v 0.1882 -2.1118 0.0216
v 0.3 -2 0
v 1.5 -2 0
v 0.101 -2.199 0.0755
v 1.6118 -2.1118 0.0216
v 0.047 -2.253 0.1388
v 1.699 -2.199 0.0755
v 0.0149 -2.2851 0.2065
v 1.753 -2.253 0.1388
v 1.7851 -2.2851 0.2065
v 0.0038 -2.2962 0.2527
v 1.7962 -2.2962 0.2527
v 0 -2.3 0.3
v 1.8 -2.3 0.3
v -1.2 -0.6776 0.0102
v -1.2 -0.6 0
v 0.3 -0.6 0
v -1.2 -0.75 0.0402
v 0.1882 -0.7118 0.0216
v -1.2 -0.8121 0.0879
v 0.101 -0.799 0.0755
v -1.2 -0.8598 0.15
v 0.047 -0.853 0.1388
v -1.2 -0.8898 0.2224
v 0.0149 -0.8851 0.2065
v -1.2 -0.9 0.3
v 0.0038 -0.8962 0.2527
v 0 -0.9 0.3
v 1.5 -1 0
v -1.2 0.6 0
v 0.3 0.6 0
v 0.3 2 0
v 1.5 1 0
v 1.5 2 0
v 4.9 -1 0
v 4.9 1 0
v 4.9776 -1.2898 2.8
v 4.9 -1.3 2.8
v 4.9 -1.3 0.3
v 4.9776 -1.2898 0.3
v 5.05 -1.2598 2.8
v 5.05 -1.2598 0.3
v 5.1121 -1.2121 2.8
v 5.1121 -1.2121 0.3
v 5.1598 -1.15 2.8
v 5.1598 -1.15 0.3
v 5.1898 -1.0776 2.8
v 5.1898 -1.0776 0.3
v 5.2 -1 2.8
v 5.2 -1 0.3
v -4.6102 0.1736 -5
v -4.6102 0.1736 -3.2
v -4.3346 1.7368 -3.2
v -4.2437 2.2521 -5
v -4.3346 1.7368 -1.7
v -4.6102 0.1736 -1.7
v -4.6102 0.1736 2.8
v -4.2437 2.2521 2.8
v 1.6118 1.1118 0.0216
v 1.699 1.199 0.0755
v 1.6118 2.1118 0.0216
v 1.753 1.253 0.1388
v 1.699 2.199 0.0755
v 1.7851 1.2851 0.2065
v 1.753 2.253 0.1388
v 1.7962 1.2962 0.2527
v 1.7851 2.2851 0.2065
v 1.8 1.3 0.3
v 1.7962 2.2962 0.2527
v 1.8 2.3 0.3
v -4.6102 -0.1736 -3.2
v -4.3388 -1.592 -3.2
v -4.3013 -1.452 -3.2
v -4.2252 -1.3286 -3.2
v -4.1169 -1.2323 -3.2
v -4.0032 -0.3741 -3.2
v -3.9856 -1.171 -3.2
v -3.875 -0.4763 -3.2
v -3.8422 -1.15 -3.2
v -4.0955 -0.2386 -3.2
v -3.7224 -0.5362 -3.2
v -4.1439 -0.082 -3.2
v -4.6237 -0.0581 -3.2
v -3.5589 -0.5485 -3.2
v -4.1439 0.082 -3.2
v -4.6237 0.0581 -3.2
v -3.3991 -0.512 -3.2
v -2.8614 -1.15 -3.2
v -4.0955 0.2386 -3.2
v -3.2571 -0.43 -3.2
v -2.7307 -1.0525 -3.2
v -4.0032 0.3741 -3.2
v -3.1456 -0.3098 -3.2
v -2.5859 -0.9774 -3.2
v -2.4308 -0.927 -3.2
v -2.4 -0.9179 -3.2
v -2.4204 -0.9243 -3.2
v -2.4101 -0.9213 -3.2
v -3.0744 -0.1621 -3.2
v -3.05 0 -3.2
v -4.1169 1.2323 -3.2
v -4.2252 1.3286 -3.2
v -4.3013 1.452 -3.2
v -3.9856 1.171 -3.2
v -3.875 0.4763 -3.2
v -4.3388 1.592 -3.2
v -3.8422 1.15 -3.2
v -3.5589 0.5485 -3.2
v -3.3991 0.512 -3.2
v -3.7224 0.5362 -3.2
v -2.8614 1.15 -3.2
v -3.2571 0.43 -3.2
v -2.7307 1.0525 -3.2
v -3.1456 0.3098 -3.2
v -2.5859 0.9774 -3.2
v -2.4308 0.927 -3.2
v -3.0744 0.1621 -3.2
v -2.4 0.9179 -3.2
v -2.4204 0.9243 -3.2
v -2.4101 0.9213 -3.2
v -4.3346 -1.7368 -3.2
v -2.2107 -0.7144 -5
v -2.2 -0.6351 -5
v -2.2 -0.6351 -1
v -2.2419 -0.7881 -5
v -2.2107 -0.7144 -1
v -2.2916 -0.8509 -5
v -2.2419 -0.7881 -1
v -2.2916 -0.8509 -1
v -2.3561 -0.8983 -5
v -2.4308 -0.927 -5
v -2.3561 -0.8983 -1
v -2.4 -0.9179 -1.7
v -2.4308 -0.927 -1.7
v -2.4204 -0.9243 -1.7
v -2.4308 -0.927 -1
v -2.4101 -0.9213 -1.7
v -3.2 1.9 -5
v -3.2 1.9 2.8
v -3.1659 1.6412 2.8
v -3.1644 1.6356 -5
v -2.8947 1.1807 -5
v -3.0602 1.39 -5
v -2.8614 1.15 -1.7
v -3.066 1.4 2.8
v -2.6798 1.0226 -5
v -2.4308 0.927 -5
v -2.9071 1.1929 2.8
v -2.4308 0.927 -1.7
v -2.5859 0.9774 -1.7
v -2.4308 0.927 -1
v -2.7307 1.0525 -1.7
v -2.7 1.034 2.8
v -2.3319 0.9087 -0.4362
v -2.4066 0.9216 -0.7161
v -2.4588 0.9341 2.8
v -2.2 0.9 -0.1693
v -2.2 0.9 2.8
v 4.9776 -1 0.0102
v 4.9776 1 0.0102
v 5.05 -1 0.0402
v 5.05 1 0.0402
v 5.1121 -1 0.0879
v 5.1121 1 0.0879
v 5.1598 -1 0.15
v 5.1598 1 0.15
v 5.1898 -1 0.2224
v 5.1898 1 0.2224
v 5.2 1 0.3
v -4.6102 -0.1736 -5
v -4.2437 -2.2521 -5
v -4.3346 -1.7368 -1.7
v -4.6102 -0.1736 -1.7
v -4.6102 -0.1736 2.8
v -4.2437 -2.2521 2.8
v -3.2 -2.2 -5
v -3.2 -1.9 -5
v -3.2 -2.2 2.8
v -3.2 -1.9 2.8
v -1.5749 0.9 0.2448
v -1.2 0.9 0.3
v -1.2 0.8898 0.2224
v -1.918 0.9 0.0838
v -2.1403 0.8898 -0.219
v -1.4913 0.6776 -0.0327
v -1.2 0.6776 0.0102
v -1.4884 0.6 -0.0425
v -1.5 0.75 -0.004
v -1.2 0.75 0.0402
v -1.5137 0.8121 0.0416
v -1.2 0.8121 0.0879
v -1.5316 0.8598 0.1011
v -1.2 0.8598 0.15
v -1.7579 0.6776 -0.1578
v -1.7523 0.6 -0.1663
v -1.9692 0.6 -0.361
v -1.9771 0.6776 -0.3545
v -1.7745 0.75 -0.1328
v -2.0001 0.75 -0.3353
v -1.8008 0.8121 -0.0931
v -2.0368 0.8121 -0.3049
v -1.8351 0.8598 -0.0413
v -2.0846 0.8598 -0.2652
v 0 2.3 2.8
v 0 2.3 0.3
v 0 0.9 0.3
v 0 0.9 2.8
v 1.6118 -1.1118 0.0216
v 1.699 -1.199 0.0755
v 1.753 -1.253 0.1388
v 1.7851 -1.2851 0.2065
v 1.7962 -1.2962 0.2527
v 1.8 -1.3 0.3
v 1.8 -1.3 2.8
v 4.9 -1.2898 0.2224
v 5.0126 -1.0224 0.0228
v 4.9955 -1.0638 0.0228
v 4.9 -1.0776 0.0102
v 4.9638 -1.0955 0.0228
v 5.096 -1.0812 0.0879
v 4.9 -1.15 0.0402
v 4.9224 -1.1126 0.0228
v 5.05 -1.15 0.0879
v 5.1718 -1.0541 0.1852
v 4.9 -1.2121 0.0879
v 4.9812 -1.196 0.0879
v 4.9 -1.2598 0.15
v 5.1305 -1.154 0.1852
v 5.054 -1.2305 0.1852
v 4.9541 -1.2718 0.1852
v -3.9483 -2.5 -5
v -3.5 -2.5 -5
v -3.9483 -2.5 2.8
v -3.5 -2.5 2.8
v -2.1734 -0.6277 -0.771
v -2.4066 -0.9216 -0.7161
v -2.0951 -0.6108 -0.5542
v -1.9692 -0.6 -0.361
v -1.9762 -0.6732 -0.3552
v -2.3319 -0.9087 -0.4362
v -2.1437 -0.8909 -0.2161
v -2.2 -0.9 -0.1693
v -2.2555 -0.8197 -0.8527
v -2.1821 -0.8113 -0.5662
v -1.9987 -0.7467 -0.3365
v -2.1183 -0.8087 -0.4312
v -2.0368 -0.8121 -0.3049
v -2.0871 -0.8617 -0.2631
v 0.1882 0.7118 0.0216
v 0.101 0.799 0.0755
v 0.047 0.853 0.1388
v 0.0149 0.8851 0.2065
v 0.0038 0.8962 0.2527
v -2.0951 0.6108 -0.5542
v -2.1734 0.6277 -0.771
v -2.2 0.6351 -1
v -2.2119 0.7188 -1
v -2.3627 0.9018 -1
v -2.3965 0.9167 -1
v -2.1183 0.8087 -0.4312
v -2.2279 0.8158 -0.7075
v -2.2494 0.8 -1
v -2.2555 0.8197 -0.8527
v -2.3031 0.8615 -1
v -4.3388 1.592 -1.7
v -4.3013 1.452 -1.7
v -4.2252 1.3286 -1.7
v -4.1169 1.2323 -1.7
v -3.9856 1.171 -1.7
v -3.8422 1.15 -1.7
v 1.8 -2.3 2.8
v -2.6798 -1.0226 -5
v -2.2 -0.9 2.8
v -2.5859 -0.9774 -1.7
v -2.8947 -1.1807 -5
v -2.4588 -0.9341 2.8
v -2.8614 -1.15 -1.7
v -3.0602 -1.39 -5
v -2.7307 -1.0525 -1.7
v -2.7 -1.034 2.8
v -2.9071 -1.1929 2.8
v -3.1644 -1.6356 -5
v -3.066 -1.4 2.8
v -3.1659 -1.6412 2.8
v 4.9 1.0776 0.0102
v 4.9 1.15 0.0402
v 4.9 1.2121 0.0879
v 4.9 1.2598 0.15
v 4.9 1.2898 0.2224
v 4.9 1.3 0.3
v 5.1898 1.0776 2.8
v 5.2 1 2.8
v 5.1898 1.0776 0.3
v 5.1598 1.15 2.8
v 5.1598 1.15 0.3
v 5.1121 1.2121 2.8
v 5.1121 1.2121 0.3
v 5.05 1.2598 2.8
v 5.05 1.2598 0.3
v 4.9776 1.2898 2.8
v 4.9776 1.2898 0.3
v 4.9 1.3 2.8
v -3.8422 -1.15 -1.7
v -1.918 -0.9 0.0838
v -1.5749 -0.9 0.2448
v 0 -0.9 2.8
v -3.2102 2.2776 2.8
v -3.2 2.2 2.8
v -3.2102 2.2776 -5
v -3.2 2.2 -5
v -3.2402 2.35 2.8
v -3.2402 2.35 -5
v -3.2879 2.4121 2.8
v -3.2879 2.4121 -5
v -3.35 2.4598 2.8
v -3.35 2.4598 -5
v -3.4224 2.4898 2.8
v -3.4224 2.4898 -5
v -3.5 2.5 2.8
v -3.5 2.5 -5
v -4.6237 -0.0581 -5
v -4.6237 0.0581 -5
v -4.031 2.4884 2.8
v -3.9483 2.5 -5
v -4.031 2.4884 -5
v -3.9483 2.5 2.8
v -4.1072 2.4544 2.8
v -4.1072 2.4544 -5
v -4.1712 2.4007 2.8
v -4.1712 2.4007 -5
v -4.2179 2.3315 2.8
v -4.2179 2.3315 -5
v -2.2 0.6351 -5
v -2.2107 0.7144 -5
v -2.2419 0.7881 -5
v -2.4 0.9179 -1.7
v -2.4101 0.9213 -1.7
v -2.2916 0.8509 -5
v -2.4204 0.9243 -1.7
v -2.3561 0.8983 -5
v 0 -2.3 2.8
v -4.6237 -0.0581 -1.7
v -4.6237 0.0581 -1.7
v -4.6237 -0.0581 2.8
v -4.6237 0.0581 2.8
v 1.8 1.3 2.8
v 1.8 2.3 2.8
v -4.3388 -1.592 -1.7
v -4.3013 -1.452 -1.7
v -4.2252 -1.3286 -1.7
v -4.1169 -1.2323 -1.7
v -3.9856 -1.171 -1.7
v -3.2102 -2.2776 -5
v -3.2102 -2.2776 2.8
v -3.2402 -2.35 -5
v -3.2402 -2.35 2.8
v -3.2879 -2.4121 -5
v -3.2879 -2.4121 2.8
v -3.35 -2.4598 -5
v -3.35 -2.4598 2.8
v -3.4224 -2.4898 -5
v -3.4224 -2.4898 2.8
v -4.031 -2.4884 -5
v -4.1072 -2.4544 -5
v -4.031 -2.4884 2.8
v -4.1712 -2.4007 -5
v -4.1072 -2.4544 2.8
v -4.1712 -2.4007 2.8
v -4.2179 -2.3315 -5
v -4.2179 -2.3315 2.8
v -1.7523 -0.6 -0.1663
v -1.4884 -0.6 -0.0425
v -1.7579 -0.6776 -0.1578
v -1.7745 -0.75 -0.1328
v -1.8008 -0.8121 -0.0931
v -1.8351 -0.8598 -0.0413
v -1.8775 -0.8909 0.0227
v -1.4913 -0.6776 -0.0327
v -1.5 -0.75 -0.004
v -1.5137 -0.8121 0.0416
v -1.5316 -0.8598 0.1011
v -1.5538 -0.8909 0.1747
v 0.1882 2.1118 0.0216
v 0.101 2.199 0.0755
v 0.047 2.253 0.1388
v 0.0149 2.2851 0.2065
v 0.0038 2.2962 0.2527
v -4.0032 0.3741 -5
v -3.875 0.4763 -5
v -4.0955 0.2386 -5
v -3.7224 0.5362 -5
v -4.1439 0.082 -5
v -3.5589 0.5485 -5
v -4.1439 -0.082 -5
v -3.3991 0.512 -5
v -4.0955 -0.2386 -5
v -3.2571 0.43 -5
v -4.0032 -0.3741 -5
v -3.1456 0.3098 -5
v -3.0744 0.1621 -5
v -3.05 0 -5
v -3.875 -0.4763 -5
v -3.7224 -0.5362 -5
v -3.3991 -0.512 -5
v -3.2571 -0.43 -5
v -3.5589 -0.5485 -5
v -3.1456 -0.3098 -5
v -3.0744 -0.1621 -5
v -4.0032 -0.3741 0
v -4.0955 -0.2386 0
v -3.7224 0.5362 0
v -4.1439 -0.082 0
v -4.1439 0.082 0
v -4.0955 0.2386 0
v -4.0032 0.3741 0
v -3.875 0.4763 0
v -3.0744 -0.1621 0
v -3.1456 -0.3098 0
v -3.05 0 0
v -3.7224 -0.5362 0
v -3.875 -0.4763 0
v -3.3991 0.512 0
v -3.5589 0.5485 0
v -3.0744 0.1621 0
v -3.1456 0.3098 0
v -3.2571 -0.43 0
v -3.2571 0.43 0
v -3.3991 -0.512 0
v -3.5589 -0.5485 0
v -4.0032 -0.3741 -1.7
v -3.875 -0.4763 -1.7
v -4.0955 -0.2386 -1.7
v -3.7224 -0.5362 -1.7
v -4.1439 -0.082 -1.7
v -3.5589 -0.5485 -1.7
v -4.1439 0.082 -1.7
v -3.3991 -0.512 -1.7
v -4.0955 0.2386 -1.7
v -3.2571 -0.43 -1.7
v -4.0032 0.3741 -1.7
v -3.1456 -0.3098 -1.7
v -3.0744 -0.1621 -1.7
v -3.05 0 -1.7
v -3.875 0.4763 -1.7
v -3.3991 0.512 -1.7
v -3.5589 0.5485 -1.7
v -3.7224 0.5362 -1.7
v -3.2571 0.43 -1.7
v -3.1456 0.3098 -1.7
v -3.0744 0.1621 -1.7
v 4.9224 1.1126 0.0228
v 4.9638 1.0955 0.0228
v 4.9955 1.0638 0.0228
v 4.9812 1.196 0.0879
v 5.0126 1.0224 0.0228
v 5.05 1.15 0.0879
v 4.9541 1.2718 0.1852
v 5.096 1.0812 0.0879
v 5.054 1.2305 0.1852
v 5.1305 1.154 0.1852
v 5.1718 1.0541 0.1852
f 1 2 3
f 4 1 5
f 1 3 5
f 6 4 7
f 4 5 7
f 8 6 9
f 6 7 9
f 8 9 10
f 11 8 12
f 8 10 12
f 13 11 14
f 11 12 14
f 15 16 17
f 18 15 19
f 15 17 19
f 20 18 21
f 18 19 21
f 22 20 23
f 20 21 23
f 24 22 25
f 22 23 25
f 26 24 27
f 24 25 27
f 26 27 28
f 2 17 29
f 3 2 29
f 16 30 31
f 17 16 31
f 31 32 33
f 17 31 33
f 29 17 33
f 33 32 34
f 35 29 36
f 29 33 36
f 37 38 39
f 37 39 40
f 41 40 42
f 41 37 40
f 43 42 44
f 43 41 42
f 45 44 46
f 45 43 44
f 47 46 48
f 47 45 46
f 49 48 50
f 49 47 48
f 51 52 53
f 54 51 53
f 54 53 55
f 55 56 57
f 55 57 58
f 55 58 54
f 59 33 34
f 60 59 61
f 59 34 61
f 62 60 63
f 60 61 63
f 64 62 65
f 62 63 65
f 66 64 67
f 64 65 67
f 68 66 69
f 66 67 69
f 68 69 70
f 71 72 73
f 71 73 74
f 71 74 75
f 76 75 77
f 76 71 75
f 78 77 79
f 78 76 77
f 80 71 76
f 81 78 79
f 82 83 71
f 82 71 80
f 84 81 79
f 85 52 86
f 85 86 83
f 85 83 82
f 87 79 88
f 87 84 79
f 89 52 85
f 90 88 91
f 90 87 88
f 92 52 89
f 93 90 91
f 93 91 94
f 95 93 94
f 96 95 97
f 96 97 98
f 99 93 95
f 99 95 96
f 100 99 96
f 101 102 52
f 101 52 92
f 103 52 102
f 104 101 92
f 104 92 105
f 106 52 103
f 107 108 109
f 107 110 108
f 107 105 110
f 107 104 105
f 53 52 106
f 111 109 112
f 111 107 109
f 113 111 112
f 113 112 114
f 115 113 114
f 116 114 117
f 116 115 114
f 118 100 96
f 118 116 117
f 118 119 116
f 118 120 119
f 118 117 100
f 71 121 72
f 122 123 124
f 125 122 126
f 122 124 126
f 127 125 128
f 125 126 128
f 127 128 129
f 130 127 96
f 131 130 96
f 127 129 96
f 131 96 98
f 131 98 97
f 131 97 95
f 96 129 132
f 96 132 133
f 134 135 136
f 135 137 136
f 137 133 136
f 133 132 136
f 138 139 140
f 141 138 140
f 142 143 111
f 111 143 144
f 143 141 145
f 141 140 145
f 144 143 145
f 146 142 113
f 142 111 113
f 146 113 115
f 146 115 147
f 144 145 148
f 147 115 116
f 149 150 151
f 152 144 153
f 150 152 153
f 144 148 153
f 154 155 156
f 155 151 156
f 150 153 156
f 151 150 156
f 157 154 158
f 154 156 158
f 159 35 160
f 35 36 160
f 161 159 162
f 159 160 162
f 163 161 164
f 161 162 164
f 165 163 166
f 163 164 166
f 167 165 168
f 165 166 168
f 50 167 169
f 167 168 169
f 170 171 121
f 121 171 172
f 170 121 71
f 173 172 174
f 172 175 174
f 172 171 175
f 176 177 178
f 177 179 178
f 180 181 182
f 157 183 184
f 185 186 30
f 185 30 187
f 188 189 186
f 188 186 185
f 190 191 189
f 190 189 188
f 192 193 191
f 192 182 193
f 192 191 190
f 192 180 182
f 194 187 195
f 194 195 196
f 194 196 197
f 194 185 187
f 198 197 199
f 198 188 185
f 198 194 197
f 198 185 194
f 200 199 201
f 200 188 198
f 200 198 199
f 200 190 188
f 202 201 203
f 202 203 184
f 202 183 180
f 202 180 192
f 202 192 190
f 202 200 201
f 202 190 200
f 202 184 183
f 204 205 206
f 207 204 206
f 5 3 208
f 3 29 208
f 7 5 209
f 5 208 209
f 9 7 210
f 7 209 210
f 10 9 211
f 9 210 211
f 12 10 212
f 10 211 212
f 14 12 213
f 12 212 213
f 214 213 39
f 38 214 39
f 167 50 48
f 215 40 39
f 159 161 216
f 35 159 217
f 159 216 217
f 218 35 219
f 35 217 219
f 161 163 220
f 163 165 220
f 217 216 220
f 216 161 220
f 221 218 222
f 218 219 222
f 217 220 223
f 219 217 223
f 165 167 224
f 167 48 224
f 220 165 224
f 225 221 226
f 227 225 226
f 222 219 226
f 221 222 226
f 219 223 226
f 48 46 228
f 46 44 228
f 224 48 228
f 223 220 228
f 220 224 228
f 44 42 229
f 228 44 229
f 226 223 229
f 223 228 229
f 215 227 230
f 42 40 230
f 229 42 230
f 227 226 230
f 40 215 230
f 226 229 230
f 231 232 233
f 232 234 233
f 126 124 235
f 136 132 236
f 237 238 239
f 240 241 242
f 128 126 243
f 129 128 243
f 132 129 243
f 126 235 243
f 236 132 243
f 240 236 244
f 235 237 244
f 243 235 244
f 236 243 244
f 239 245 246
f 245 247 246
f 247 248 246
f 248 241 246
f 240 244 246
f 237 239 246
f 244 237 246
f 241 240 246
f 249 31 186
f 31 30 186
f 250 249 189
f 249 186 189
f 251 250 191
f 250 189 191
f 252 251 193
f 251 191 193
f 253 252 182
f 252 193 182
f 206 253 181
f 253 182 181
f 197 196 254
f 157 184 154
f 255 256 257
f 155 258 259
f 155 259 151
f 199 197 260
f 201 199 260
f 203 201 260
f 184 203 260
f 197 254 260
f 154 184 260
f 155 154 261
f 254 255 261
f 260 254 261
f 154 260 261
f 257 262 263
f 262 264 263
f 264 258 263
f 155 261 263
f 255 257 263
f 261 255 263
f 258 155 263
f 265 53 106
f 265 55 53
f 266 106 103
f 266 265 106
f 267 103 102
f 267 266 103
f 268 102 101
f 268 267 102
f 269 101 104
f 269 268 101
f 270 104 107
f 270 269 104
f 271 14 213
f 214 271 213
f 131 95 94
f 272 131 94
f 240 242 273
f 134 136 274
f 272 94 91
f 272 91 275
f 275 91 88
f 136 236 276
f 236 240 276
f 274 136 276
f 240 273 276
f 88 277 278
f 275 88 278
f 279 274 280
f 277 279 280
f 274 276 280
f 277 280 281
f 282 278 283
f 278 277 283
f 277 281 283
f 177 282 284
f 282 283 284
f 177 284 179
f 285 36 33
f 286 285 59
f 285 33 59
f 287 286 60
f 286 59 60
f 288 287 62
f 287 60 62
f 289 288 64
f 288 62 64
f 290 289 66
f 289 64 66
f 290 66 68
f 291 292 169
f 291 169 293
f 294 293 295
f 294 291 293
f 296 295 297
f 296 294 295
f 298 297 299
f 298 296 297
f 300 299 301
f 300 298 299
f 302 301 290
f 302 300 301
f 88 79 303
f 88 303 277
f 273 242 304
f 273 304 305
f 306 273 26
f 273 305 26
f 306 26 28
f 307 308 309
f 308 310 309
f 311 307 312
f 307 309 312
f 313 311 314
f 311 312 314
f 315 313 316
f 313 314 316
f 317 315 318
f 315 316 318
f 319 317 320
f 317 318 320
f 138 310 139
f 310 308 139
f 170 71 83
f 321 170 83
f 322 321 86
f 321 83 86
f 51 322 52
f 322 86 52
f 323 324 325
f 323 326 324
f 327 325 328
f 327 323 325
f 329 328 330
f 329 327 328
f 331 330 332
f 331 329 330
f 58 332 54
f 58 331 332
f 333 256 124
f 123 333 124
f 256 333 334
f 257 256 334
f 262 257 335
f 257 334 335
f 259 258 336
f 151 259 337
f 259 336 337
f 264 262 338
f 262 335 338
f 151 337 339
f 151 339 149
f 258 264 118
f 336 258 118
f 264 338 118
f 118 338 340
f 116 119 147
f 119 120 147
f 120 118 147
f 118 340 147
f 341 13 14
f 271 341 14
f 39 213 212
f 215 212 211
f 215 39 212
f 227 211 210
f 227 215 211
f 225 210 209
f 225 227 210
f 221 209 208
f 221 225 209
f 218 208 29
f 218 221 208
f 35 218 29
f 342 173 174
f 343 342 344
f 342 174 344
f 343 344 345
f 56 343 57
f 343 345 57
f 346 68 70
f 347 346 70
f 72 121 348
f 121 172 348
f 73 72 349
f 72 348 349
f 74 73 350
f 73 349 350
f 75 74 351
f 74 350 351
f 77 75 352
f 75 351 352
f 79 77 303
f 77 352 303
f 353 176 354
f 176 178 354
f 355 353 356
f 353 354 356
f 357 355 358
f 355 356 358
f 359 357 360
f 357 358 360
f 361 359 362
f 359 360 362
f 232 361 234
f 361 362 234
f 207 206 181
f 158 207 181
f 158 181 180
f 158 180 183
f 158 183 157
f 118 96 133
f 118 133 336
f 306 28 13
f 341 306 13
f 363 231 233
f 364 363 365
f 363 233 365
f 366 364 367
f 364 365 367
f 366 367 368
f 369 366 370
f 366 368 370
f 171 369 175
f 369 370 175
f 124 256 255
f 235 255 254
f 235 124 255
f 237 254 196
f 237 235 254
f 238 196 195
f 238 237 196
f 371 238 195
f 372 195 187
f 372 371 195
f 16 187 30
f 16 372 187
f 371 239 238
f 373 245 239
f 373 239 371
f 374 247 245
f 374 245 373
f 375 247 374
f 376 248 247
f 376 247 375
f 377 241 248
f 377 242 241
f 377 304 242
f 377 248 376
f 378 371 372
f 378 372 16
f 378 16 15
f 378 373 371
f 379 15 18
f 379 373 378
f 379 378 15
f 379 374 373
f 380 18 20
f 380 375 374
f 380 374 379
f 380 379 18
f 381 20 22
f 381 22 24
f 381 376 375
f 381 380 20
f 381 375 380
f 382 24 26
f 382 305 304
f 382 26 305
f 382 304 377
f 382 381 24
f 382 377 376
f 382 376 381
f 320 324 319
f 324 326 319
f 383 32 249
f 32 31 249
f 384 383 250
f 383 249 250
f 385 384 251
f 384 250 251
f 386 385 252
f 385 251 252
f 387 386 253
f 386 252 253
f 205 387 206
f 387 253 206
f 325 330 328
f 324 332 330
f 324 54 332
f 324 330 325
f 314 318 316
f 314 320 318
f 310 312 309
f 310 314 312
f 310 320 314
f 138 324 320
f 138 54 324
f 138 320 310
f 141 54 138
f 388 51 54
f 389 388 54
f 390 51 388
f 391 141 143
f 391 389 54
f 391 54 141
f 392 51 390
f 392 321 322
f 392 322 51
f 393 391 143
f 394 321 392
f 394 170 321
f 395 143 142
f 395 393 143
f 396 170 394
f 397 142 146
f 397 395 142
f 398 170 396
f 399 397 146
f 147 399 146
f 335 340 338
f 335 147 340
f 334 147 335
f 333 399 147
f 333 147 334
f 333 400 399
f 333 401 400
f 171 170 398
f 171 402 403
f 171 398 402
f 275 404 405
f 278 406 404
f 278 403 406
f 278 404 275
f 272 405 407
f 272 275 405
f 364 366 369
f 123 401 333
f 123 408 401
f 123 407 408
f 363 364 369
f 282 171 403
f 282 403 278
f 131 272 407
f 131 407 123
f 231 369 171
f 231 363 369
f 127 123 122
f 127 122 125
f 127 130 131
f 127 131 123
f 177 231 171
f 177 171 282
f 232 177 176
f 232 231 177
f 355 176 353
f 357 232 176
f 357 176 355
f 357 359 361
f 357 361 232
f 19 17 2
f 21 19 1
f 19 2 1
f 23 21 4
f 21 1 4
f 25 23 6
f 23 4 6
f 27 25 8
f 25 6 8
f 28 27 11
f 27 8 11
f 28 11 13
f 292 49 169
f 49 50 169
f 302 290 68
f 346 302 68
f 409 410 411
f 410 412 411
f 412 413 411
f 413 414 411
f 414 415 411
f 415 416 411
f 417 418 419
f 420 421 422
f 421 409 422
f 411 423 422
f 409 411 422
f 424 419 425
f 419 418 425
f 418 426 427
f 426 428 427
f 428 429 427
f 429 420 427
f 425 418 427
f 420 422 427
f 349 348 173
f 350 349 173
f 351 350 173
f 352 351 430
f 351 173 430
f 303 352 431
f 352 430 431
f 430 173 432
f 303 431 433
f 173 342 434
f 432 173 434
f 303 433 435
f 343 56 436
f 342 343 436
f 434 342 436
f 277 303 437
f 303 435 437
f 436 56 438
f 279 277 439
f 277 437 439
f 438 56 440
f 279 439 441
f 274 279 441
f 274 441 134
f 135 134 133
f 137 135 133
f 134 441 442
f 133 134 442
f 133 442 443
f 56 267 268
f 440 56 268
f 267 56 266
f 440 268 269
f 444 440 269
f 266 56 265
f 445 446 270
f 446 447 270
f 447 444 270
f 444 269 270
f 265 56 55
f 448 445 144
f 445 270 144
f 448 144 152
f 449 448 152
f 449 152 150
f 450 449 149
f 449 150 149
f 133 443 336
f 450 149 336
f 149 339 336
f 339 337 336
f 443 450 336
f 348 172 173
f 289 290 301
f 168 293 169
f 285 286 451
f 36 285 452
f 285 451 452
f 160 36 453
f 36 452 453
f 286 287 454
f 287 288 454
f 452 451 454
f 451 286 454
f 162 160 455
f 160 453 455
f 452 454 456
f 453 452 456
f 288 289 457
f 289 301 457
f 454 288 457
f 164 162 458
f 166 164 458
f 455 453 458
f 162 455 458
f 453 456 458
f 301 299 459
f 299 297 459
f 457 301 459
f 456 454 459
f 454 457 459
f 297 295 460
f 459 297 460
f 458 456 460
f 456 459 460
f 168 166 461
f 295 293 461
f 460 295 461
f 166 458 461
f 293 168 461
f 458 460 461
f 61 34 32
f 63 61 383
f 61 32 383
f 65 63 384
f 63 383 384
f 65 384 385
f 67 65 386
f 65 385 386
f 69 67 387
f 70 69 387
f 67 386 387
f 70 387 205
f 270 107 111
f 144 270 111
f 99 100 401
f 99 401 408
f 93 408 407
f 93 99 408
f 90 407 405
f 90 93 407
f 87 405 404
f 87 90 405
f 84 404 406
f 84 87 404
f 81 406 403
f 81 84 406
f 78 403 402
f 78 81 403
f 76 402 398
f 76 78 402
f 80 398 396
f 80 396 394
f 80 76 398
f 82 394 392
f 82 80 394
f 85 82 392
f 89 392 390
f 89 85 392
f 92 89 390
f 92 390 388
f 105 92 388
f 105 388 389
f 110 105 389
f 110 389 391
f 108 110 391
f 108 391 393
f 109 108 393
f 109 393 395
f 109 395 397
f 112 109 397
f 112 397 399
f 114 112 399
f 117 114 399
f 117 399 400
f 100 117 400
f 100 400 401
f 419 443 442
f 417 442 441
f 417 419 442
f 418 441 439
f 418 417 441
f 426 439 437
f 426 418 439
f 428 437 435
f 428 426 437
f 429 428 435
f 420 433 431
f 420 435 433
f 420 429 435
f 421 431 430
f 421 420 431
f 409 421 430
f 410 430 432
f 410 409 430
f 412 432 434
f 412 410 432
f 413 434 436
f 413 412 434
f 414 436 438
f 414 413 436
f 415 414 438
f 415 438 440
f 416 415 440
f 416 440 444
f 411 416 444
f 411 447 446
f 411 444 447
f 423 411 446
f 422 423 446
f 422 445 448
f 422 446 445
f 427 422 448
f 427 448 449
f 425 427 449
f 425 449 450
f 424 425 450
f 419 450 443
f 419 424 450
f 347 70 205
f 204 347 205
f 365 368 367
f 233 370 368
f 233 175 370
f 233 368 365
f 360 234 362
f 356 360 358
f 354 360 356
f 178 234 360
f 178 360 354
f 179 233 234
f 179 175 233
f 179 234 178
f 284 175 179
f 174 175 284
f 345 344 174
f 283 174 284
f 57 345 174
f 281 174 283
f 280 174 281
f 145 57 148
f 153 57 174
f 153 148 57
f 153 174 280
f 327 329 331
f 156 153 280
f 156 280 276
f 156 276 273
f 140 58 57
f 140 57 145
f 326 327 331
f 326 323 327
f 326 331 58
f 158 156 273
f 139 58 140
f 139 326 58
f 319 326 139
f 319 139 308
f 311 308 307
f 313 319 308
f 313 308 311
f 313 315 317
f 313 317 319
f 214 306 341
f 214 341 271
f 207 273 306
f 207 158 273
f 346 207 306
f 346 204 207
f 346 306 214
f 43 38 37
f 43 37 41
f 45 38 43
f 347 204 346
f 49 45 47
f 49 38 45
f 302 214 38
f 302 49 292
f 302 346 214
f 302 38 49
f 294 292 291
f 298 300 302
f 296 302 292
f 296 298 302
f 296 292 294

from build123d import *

# Parameters (mm, degrees)
F1_DEPTH = 2.8
F2_R     = 0.55
F3_DEPTH = 5
F4_R     = 1
F5_R     = 0.3
F7_W     = 2.5907744158
F7_H     = 2.3
F8_DEPTH = 1.5
F9_R     = 0.5


with BuildPart() as f1:
    # F0 (on Top) → F1 (new body)
    with BuildSketch(Plane.XY):
        with BuildLine():
            Line((-4.2, -2.5), (-3.2, -2.5))
            Line((-3.2, -2.5), (-3.2, -1.9))
            ThreePointArc((-3.2, -1.9), (-2.9071067812, -1.1928932188), (-2.2, -0.9))
            Line((-2.2, -0.9), (0, -0.9))
            Line((0, -0.9), (0, -2.3))
            Line((0, -2.3), (1.8, -2.3))
            Line((1.8, -2.3), (1.8, -1.3))
            Line((1.8, -1.3), (5.2, -1.3))
            Line((5.2, -1.3), (5.2, 0))
            Line((5.2, 0), (5.2, 1.3))
            Line((5.2, 1.3), (1.8, 1.3))
            Line((1.8, 1.3), (1.8, 2.3))
            Line((1.8, 2.3), (0, 2.3))
            Line((0, 2.3), (0, 0.9))
            Line((0, 0.9), (-2.2, 0.9))
            ThreePointArc((-2.2, 0.9), (-2.9071067812, 1.1928932188), (-3.2, 1.9))
            Line((-3.2, 1.9), (-3.2, 2.5))
            Line((-3.2, 2.5), (-4.2, 2.5))
            Line((-4.2, 2.5), (-4.6408174518, 0))
            Line((-4.6408174518, 0), (-4.2, -2.5))
        make_face()
    extrude(amount=F1_DEPTH)

    # F2 (on face) → F3 (join)
    with BuildSketch(Plane(origin=(0, 0, 0), x_dir=(1, 0, 0), z_dir=(0, 0, -1))):
        with BuildLine():
            Line((-4.2, -2.5), (-3.2, -2.5))
            Line((-3.2, -2.5), (-3.2, -1.9))
            ThreePointArc((-3.2, -1.9), (-2.9071067812, -1.1928932188), (-2.2, -0.9))
            Line((-2.2, -0.9), (-2.2, 0.9))
            ThreePointArc((-2.2, 0.9), (-2.9071067812, 1.1928932188), (-3.2, 1.9))
            Line((-3.2, 1.9), (-3.2, 2.5))
            Line((-3.2, 2.5), (-4.2, 2.5))
            Line((-4.2, 2.5), (-4.6408174518, 0))
            Line((-4.6408174518, 0), (-4.2, -2.5))
        make_face()
        with Locations((-3.6, 0)):
            Circle(F2_R, mode=Mode.SUBTRACT)
    extrude(amount=F3_DEPTH)

    # F4
    f4_edges = [f1.edges().sort_by_distance(p)[0] for p in [
        (-2.2, 0, 0),
        (-4.640817, 0, -1.1),
    ]]
    fillet(f4_edges, radius=F4_R)

    # F5
    f5_edges = [f1.edges().sort_by_distance(p)[0] for p in [
        (5.2, -1.3, 1.4),
        (5.2, 1.3, 1.4),
        (-3.2, 2.5, -1.1),
        (-4.2, 2.5, -1.1),
        (-3.2, -2.5, -1.1),
        (-4.2, -2.5, -1.1),
        (-0.6, 0.9, 0),
        (-1.2, 0, 0),
        (0, 1.6, 0),
        (-0.6, -0.9, 0),
        (0.9, 2.3, 0),
        (0, -1.6, 0),
        (1.8, 1.8, 0),
        (0.9, -2.3, 0),
        (3.5, 1.3, 0),
        (1.8, -1.8, 0),
        (5.2, 0, 0),
        (3.5, -1.3, 0),
    ]]
    fillet(f5_edges, radius=F5_R)

    # F7 (on offset) → F8 (cut)
    with BuildSketch(Plane.XY.offset(-3.2)):
        with Locations((-3.6953872079, 0)):
            Rectangle(F7_W, F7_H)
    extrude(amount=F8_DEPTH, mode=Mode.SUBTRACT)

    # F9
    f9_edges = [f1.edges().sort_by_distance(p)[0] for p in [
        (-4.438041, 1.15, -2.45),
        (-4.438041, -1.15, -2.45),
    ]]
    fillet(f9_edges, radius=F9_R)


solid = f1.part
